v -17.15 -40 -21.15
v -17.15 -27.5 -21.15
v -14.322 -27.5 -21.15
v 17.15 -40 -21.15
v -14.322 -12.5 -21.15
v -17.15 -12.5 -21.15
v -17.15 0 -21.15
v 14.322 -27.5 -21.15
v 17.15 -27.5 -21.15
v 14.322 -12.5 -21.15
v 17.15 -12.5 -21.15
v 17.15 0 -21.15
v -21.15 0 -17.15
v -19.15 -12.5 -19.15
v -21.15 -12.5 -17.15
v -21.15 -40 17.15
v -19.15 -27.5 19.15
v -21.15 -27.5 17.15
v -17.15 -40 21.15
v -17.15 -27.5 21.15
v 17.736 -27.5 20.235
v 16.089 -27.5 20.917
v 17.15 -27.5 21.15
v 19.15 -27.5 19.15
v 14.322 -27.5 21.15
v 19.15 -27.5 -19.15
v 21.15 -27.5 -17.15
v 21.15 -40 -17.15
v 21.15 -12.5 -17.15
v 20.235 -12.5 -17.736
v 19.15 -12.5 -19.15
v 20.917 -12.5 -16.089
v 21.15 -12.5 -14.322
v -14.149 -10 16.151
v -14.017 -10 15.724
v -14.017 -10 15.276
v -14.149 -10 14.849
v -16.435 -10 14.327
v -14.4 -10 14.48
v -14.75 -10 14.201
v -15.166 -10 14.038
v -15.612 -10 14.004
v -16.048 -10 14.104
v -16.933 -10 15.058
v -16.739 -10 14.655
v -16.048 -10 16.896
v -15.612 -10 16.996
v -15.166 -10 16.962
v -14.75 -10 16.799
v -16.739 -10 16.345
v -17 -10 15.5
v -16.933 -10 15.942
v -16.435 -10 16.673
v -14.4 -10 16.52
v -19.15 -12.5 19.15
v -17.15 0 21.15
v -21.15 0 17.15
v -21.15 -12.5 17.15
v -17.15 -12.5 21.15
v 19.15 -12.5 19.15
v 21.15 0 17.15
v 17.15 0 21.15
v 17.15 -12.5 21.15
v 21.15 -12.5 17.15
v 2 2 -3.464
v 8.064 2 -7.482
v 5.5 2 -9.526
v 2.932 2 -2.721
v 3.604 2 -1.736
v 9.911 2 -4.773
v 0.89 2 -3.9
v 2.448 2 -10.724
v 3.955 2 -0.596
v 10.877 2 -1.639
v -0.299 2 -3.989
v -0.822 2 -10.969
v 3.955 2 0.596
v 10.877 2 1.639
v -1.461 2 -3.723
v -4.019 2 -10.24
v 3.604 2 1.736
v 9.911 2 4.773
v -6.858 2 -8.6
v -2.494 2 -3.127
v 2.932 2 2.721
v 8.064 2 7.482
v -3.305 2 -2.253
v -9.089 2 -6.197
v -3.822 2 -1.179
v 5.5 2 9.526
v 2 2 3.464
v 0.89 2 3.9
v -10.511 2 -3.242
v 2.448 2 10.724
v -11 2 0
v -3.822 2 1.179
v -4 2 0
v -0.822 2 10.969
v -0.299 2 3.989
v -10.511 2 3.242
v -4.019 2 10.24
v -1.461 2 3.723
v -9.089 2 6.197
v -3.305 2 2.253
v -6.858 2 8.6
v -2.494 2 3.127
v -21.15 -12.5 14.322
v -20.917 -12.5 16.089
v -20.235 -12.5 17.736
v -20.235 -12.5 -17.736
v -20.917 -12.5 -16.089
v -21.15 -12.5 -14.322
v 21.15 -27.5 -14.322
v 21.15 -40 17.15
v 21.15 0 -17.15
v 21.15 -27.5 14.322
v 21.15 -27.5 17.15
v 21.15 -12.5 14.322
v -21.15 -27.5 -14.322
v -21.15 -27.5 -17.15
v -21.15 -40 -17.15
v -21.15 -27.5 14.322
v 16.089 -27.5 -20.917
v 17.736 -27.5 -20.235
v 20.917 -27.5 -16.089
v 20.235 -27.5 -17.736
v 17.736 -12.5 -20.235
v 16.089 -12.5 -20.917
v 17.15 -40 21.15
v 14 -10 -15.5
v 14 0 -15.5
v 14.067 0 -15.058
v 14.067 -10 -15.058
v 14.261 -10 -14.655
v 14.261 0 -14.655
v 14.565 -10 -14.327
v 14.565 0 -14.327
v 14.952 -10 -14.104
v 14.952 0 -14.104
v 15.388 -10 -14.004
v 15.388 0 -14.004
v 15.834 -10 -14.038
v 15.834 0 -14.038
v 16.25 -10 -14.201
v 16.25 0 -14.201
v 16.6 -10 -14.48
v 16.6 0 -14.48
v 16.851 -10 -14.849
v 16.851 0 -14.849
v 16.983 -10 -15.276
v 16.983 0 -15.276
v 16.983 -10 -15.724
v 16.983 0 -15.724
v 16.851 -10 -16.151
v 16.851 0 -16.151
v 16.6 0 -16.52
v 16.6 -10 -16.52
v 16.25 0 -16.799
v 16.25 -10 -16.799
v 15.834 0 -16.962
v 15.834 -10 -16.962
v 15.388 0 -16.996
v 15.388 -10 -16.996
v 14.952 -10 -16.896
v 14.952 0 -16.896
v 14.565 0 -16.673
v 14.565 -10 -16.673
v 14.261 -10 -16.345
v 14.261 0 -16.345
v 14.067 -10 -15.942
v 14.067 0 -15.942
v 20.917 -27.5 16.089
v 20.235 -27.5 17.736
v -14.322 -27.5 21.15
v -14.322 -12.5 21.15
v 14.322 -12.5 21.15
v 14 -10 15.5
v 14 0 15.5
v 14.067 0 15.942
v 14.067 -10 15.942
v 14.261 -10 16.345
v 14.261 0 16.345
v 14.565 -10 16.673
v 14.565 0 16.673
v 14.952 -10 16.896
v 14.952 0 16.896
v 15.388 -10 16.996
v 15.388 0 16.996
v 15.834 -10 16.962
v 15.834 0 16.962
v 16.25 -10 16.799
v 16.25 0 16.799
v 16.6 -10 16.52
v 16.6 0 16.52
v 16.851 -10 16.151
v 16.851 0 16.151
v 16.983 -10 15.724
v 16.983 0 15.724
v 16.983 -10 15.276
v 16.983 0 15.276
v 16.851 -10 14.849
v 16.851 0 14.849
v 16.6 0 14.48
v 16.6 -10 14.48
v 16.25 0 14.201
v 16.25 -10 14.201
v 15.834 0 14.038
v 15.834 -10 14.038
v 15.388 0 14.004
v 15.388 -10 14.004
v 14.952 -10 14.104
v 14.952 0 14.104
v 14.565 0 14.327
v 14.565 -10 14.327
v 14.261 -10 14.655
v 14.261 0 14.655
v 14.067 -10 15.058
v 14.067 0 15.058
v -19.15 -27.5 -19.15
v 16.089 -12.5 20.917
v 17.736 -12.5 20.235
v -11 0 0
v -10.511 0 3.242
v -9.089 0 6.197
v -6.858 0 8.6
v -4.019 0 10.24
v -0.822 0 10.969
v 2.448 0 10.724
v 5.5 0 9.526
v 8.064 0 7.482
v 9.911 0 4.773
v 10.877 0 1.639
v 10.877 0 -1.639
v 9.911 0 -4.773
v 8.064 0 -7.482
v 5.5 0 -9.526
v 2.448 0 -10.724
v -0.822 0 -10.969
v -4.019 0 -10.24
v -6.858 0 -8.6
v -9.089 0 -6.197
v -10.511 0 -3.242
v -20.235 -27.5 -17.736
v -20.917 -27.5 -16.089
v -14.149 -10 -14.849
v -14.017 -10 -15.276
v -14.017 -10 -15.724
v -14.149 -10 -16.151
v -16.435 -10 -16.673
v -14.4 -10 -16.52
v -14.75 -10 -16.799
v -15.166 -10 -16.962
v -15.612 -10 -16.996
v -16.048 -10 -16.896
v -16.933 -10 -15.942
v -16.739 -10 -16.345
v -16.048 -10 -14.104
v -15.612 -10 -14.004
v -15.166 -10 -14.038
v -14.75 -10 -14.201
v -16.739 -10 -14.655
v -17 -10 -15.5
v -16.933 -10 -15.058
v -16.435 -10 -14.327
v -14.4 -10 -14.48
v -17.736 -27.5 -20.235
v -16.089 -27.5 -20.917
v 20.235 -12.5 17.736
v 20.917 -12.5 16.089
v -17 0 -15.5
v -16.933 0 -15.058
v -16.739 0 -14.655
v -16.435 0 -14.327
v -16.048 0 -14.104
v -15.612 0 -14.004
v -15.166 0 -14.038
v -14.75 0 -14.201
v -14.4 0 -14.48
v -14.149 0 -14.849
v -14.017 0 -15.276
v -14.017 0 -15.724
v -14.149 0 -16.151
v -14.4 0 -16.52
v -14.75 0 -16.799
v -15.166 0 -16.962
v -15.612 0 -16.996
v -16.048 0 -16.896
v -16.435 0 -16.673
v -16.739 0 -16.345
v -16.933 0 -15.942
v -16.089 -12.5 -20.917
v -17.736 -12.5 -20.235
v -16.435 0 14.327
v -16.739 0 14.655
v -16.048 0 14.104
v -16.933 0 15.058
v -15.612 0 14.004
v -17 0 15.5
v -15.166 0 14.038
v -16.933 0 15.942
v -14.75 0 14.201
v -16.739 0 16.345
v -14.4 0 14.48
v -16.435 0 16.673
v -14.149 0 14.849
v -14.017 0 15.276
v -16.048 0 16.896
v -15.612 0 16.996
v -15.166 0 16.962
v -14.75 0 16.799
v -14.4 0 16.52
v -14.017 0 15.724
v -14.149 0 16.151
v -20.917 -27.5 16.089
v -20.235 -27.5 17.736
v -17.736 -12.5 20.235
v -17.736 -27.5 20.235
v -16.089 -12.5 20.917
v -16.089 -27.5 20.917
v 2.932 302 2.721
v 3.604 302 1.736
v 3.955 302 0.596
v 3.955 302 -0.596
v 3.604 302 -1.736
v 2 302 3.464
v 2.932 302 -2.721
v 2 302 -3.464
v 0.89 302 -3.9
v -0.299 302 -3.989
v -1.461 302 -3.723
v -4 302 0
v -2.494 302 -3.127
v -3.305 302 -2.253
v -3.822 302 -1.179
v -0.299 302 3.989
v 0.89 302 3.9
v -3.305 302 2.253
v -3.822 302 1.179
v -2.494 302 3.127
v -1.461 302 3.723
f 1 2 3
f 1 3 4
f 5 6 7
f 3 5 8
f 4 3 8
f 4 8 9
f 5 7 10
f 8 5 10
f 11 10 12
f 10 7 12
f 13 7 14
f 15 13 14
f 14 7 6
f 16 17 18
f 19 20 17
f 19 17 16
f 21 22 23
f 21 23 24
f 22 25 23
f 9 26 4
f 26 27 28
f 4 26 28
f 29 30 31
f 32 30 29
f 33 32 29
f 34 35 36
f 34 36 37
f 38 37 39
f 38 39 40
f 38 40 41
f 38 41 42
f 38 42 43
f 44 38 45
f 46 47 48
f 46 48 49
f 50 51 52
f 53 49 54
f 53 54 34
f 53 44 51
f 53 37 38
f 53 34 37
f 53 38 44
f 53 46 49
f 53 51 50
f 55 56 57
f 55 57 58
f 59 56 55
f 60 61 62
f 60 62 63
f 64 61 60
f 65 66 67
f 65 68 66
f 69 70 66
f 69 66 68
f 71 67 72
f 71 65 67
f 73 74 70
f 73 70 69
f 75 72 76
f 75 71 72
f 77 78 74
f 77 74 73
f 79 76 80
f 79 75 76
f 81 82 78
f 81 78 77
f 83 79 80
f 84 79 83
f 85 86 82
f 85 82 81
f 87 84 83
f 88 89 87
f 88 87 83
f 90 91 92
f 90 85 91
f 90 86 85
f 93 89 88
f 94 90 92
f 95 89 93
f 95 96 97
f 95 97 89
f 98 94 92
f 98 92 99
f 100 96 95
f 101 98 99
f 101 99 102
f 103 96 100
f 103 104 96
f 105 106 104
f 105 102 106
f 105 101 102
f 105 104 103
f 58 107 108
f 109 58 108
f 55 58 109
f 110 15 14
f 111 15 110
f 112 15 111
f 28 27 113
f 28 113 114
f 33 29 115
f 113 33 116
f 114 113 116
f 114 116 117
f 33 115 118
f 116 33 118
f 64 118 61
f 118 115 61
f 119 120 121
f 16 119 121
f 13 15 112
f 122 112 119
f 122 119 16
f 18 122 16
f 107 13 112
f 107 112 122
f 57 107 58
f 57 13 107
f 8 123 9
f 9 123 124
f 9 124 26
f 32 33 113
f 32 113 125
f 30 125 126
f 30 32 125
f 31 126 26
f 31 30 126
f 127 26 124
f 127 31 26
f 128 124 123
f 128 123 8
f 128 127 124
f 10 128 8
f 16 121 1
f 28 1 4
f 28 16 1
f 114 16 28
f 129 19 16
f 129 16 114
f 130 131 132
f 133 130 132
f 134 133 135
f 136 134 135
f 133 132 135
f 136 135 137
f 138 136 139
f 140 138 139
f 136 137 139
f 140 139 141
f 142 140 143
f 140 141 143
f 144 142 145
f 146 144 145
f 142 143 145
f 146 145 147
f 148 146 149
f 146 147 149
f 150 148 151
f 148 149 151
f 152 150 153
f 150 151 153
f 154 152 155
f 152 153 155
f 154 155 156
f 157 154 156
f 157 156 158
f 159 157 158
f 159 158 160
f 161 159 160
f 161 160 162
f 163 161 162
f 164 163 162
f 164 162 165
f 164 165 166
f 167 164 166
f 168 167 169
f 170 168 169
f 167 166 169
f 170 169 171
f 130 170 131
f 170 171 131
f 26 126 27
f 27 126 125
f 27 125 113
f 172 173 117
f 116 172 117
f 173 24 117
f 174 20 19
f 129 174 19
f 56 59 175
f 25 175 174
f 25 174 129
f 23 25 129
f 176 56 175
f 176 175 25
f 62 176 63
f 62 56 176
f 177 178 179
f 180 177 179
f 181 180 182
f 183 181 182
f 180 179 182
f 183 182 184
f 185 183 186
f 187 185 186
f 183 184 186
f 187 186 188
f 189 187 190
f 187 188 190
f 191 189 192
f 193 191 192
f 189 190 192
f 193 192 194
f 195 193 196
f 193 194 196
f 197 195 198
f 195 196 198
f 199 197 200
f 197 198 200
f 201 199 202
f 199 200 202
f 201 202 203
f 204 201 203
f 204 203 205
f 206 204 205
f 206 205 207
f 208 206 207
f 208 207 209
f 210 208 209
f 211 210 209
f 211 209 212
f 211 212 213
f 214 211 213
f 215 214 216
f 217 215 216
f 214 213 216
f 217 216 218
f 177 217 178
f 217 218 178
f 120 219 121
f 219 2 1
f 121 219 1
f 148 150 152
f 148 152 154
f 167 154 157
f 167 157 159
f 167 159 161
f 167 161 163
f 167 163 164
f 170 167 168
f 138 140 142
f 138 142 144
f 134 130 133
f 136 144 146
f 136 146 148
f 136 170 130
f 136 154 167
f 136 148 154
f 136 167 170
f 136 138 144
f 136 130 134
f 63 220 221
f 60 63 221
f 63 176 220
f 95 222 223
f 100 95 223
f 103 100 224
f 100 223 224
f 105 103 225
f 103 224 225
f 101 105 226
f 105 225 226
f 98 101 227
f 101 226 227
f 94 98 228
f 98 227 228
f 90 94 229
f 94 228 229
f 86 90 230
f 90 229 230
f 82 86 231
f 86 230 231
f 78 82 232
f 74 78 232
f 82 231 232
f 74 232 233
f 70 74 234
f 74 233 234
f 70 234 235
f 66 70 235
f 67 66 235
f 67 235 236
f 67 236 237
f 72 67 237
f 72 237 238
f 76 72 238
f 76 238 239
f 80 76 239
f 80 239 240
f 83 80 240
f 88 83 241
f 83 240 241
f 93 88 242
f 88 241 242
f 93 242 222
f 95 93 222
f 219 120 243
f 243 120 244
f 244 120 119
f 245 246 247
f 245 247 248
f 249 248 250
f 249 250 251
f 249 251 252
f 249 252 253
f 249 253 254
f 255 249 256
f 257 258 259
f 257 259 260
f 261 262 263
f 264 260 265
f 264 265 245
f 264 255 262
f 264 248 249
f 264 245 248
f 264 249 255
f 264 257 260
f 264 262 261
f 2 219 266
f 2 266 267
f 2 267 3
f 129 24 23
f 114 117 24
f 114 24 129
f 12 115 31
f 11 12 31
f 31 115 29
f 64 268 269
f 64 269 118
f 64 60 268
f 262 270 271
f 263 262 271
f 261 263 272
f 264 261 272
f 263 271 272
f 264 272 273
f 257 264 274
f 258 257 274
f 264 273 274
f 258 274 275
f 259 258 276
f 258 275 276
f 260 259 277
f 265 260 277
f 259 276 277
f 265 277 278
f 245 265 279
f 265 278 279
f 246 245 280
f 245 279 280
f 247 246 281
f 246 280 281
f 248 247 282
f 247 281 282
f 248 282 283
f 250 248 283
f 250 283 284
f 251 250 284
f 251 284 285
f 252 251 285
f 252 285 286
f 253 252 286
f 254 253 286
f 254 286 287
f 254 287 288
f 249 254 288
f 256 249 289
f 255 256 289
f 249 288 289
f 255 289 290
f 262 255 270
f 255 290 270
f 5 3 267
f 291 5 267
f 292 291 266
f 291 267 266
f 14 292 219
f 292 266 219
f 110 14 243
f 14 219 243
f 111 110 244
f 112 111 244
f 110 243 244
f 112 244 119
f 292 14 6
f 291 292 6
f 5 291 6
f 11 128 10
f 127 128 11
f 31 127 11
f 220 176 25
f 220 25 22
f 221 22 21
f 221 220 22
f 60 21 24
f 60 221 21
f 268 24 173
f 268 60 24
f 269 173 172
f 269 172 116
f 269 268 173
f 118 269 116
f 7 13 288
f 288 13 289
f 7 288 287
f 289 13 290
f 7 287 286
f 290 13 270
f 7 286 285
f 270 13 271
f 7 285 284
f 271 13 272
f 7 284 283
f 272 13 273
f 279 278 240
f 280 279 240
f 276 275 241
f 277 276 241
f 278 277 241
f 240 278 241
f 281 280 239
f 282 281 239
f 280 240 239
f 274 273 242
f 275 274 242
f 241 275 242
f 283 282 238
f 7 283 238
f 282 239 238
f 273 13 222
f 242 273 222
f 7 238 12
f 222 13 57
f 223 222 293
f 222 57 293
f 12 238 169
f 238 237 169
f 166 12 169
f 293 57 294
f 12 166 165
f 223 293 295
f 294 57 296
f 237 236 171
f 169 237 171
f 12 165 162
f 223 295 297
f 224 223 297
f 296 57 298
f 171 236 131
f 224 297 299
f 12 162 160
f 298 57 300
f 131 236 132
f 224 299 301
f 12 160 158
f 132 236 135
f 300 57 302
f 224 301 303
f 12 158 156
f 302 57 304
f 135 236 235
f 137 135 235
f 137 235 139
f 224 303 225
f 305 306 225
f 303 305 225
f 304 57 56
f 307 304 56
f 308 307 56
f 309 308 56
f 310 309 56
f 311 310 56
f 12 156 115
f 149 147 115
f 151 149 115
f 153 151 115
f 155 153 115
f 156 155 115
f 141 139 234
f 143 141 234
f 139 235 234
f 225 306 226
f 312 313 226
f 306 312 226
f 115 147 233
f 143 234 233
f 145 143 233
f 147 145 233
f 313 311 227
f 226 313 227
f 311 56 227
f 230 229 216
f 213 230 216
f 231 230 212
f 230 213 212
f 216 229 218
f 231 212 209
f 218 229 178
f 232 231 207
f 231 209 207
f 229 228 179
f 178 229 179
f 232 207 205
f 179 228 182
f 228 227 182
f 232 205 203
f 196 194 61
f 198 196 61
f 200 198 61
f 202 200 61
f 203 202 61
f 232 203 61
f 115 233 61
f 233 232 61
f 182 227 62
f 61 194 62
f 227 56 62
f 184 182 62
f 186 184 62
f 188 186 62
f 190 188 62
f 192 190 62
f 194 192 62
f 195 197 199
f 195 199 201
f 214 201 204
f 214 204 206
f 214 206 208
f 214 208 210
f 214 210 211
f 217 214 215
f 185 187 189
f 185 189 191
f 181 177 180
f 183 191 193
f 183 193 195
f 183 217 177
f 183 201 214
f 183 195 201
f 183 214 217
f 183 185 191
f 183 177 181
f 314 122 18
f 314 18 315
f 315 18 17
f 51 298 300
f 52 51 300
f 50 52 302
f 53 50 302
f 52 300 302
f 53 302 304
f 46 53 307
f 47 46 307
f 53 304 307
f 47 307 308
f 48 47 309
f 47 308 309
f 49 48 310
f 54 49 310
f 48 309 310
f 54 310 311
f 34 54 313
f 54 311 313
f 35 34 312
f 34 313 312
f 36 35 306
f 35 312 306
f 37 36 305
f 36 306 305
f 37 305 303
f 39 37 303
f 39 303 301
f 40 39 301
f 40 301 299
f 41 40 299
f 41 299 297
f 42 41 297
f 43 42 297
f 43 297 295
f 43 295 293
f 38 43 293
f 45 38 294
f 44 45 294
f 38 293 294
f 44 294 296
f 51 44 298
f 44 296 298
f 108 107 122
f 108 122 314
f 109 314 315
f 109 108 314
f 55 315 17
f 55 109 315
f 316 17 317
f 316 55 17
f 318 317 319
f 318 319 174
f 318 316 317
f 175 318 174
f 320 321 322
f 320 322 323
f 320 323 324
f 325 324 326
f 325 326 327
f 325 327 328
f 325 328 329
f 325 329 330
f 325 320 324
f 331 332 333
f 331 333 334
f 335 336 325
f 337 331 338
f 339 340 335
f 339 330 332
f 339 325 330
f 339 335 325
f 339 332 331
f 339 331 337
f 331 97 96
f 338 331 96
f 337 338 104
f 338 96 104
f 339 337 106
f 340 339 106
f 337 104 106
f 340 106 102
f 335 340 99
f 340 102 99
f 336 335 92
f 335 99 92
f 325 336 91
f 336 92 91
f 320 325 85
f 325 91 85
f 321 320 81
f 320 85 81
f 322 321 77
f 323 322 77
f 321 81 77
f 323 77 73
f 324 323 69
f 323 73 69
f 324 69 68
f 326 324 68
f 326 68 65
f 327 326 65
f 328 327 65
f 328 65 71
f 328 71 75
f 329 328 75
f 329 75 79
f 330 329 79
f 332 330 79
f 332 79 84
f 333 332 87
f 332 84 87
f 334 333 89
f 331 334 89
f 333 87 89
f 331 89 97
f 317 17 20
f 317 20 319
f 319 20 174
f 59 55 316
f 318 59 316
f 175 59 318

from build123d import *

# Parameters (mm, degrees)
F0_W      = 42.3
F0_H      = 42.3
F1_DEPTH  = 40
F2_R      = 11
F3_DEPTH  = 2
F4_R      = 4
F5_DEPTH  = 300
F6_SIZE   = 4
F9_DEPTH  = 7.5
F10_R     = 1.5
F11_DEPTH = 10


with BuildPart() as f1:
    # F0 (on Front) → F1 (new body)
    with BuildSketch(Plane.XZ):
        Rectangle(F0_W, F0_H)
    extrude(amount=F1_DEPTH)

    # F2 (on face) → F3 (join)
    with BuildSketch(Plane(origin=(0, 0, 0), x_dir=(-1, 0, 0), z_dir=(0, 1, 0))):
        Circle(F2_R)
    extrude(amount=F3_DEPTH)

    # F4 (on face) → F5 (join)
    with BuildSketch(Plane(origin=(0, 2, 0), x_dir=(-1, 0, 0), z_dir=(0, 1, 0))):
        Circle(F4_R)
    extrude(amount=F5_DEPTH)

    # F6
    f6_edges = [f1.edges().sort_by_distance(p)[0] for p in [
        (-21.15, -20, 21.15),
        (-21.15, -20, -21.15),
        (21.15, -20, -21.15),
        (21.15, -20, 21.15),
    ]]
    chamfer(f6_edges, length=F6_SIZE)

    # F8 (on offset) → F9 (cut, symmetric)
    with BuildSketch(Plane.XZ.offset(20)):
        with BuildLine():
            ThreePointArc((14.3215728753, 21.15), (19.15, 19.15), (21.15, 14.3215728753))
            Line((21.15, 14.3215728753), (21.15, 21.15))
            Line((21.15, 21.15), (14.3215728753, 21.15))
        make_face()
        with BuildLine():
            Line((-21.15, 21.15), (-21.15, 14.3215728753))
            ThreePointArc((-21.15, 14.3215728753), (-19.15, 19.15), (-14.3215728753, 21.15))
            Line((-14.3215728753, 21.15), (-21.15, 21.15))
        make_face()
        with BuildLine():
            Line((21.15, -21.15), (21.15, -14.3215728753))
            ThreePointArc((21.15, -14.3215728753), (19.15, -19.15), (14.3215728753, -21.15))
            Line((14.3215728753, -21.15), (21.15, -21.15))
        make_face()
        with BuildLine():
            ThreePointArc((-14.3215728753, -21.15), (-19.15, -19.15), (-21.15, -14.3215728753))
            Line((-21.15, -14.3215728753), (-21.15, -21.15))
            Line((-21.15, -21.15), (-14.3215728753, -21.15))
        make_face()
    extrude(amount=F9_DEPTH, both=True, mode=Mode.SUBTRACT)

    # F10 (on face) → F11 (cut)
    with BuildSketch(Plane(origin=(0, 0, 0), x_dir=(-1, 0, 0), z_dir=(0, 1, 0))):
        with Locations((-15.5, 15.5)):
            Circle(F10_R)
        with Locations((15.5, 15.5)):
            Circle(F10_R)
        with Locations((-15.5, -15.5)):
            Circle(F10_R)
        with Locations((15.5, -15.5)):
            Circle(F10_R)
    extrude(amount=-F11_DEPTH, mode=Mode.SUBTRACT)


solid = f1.part
